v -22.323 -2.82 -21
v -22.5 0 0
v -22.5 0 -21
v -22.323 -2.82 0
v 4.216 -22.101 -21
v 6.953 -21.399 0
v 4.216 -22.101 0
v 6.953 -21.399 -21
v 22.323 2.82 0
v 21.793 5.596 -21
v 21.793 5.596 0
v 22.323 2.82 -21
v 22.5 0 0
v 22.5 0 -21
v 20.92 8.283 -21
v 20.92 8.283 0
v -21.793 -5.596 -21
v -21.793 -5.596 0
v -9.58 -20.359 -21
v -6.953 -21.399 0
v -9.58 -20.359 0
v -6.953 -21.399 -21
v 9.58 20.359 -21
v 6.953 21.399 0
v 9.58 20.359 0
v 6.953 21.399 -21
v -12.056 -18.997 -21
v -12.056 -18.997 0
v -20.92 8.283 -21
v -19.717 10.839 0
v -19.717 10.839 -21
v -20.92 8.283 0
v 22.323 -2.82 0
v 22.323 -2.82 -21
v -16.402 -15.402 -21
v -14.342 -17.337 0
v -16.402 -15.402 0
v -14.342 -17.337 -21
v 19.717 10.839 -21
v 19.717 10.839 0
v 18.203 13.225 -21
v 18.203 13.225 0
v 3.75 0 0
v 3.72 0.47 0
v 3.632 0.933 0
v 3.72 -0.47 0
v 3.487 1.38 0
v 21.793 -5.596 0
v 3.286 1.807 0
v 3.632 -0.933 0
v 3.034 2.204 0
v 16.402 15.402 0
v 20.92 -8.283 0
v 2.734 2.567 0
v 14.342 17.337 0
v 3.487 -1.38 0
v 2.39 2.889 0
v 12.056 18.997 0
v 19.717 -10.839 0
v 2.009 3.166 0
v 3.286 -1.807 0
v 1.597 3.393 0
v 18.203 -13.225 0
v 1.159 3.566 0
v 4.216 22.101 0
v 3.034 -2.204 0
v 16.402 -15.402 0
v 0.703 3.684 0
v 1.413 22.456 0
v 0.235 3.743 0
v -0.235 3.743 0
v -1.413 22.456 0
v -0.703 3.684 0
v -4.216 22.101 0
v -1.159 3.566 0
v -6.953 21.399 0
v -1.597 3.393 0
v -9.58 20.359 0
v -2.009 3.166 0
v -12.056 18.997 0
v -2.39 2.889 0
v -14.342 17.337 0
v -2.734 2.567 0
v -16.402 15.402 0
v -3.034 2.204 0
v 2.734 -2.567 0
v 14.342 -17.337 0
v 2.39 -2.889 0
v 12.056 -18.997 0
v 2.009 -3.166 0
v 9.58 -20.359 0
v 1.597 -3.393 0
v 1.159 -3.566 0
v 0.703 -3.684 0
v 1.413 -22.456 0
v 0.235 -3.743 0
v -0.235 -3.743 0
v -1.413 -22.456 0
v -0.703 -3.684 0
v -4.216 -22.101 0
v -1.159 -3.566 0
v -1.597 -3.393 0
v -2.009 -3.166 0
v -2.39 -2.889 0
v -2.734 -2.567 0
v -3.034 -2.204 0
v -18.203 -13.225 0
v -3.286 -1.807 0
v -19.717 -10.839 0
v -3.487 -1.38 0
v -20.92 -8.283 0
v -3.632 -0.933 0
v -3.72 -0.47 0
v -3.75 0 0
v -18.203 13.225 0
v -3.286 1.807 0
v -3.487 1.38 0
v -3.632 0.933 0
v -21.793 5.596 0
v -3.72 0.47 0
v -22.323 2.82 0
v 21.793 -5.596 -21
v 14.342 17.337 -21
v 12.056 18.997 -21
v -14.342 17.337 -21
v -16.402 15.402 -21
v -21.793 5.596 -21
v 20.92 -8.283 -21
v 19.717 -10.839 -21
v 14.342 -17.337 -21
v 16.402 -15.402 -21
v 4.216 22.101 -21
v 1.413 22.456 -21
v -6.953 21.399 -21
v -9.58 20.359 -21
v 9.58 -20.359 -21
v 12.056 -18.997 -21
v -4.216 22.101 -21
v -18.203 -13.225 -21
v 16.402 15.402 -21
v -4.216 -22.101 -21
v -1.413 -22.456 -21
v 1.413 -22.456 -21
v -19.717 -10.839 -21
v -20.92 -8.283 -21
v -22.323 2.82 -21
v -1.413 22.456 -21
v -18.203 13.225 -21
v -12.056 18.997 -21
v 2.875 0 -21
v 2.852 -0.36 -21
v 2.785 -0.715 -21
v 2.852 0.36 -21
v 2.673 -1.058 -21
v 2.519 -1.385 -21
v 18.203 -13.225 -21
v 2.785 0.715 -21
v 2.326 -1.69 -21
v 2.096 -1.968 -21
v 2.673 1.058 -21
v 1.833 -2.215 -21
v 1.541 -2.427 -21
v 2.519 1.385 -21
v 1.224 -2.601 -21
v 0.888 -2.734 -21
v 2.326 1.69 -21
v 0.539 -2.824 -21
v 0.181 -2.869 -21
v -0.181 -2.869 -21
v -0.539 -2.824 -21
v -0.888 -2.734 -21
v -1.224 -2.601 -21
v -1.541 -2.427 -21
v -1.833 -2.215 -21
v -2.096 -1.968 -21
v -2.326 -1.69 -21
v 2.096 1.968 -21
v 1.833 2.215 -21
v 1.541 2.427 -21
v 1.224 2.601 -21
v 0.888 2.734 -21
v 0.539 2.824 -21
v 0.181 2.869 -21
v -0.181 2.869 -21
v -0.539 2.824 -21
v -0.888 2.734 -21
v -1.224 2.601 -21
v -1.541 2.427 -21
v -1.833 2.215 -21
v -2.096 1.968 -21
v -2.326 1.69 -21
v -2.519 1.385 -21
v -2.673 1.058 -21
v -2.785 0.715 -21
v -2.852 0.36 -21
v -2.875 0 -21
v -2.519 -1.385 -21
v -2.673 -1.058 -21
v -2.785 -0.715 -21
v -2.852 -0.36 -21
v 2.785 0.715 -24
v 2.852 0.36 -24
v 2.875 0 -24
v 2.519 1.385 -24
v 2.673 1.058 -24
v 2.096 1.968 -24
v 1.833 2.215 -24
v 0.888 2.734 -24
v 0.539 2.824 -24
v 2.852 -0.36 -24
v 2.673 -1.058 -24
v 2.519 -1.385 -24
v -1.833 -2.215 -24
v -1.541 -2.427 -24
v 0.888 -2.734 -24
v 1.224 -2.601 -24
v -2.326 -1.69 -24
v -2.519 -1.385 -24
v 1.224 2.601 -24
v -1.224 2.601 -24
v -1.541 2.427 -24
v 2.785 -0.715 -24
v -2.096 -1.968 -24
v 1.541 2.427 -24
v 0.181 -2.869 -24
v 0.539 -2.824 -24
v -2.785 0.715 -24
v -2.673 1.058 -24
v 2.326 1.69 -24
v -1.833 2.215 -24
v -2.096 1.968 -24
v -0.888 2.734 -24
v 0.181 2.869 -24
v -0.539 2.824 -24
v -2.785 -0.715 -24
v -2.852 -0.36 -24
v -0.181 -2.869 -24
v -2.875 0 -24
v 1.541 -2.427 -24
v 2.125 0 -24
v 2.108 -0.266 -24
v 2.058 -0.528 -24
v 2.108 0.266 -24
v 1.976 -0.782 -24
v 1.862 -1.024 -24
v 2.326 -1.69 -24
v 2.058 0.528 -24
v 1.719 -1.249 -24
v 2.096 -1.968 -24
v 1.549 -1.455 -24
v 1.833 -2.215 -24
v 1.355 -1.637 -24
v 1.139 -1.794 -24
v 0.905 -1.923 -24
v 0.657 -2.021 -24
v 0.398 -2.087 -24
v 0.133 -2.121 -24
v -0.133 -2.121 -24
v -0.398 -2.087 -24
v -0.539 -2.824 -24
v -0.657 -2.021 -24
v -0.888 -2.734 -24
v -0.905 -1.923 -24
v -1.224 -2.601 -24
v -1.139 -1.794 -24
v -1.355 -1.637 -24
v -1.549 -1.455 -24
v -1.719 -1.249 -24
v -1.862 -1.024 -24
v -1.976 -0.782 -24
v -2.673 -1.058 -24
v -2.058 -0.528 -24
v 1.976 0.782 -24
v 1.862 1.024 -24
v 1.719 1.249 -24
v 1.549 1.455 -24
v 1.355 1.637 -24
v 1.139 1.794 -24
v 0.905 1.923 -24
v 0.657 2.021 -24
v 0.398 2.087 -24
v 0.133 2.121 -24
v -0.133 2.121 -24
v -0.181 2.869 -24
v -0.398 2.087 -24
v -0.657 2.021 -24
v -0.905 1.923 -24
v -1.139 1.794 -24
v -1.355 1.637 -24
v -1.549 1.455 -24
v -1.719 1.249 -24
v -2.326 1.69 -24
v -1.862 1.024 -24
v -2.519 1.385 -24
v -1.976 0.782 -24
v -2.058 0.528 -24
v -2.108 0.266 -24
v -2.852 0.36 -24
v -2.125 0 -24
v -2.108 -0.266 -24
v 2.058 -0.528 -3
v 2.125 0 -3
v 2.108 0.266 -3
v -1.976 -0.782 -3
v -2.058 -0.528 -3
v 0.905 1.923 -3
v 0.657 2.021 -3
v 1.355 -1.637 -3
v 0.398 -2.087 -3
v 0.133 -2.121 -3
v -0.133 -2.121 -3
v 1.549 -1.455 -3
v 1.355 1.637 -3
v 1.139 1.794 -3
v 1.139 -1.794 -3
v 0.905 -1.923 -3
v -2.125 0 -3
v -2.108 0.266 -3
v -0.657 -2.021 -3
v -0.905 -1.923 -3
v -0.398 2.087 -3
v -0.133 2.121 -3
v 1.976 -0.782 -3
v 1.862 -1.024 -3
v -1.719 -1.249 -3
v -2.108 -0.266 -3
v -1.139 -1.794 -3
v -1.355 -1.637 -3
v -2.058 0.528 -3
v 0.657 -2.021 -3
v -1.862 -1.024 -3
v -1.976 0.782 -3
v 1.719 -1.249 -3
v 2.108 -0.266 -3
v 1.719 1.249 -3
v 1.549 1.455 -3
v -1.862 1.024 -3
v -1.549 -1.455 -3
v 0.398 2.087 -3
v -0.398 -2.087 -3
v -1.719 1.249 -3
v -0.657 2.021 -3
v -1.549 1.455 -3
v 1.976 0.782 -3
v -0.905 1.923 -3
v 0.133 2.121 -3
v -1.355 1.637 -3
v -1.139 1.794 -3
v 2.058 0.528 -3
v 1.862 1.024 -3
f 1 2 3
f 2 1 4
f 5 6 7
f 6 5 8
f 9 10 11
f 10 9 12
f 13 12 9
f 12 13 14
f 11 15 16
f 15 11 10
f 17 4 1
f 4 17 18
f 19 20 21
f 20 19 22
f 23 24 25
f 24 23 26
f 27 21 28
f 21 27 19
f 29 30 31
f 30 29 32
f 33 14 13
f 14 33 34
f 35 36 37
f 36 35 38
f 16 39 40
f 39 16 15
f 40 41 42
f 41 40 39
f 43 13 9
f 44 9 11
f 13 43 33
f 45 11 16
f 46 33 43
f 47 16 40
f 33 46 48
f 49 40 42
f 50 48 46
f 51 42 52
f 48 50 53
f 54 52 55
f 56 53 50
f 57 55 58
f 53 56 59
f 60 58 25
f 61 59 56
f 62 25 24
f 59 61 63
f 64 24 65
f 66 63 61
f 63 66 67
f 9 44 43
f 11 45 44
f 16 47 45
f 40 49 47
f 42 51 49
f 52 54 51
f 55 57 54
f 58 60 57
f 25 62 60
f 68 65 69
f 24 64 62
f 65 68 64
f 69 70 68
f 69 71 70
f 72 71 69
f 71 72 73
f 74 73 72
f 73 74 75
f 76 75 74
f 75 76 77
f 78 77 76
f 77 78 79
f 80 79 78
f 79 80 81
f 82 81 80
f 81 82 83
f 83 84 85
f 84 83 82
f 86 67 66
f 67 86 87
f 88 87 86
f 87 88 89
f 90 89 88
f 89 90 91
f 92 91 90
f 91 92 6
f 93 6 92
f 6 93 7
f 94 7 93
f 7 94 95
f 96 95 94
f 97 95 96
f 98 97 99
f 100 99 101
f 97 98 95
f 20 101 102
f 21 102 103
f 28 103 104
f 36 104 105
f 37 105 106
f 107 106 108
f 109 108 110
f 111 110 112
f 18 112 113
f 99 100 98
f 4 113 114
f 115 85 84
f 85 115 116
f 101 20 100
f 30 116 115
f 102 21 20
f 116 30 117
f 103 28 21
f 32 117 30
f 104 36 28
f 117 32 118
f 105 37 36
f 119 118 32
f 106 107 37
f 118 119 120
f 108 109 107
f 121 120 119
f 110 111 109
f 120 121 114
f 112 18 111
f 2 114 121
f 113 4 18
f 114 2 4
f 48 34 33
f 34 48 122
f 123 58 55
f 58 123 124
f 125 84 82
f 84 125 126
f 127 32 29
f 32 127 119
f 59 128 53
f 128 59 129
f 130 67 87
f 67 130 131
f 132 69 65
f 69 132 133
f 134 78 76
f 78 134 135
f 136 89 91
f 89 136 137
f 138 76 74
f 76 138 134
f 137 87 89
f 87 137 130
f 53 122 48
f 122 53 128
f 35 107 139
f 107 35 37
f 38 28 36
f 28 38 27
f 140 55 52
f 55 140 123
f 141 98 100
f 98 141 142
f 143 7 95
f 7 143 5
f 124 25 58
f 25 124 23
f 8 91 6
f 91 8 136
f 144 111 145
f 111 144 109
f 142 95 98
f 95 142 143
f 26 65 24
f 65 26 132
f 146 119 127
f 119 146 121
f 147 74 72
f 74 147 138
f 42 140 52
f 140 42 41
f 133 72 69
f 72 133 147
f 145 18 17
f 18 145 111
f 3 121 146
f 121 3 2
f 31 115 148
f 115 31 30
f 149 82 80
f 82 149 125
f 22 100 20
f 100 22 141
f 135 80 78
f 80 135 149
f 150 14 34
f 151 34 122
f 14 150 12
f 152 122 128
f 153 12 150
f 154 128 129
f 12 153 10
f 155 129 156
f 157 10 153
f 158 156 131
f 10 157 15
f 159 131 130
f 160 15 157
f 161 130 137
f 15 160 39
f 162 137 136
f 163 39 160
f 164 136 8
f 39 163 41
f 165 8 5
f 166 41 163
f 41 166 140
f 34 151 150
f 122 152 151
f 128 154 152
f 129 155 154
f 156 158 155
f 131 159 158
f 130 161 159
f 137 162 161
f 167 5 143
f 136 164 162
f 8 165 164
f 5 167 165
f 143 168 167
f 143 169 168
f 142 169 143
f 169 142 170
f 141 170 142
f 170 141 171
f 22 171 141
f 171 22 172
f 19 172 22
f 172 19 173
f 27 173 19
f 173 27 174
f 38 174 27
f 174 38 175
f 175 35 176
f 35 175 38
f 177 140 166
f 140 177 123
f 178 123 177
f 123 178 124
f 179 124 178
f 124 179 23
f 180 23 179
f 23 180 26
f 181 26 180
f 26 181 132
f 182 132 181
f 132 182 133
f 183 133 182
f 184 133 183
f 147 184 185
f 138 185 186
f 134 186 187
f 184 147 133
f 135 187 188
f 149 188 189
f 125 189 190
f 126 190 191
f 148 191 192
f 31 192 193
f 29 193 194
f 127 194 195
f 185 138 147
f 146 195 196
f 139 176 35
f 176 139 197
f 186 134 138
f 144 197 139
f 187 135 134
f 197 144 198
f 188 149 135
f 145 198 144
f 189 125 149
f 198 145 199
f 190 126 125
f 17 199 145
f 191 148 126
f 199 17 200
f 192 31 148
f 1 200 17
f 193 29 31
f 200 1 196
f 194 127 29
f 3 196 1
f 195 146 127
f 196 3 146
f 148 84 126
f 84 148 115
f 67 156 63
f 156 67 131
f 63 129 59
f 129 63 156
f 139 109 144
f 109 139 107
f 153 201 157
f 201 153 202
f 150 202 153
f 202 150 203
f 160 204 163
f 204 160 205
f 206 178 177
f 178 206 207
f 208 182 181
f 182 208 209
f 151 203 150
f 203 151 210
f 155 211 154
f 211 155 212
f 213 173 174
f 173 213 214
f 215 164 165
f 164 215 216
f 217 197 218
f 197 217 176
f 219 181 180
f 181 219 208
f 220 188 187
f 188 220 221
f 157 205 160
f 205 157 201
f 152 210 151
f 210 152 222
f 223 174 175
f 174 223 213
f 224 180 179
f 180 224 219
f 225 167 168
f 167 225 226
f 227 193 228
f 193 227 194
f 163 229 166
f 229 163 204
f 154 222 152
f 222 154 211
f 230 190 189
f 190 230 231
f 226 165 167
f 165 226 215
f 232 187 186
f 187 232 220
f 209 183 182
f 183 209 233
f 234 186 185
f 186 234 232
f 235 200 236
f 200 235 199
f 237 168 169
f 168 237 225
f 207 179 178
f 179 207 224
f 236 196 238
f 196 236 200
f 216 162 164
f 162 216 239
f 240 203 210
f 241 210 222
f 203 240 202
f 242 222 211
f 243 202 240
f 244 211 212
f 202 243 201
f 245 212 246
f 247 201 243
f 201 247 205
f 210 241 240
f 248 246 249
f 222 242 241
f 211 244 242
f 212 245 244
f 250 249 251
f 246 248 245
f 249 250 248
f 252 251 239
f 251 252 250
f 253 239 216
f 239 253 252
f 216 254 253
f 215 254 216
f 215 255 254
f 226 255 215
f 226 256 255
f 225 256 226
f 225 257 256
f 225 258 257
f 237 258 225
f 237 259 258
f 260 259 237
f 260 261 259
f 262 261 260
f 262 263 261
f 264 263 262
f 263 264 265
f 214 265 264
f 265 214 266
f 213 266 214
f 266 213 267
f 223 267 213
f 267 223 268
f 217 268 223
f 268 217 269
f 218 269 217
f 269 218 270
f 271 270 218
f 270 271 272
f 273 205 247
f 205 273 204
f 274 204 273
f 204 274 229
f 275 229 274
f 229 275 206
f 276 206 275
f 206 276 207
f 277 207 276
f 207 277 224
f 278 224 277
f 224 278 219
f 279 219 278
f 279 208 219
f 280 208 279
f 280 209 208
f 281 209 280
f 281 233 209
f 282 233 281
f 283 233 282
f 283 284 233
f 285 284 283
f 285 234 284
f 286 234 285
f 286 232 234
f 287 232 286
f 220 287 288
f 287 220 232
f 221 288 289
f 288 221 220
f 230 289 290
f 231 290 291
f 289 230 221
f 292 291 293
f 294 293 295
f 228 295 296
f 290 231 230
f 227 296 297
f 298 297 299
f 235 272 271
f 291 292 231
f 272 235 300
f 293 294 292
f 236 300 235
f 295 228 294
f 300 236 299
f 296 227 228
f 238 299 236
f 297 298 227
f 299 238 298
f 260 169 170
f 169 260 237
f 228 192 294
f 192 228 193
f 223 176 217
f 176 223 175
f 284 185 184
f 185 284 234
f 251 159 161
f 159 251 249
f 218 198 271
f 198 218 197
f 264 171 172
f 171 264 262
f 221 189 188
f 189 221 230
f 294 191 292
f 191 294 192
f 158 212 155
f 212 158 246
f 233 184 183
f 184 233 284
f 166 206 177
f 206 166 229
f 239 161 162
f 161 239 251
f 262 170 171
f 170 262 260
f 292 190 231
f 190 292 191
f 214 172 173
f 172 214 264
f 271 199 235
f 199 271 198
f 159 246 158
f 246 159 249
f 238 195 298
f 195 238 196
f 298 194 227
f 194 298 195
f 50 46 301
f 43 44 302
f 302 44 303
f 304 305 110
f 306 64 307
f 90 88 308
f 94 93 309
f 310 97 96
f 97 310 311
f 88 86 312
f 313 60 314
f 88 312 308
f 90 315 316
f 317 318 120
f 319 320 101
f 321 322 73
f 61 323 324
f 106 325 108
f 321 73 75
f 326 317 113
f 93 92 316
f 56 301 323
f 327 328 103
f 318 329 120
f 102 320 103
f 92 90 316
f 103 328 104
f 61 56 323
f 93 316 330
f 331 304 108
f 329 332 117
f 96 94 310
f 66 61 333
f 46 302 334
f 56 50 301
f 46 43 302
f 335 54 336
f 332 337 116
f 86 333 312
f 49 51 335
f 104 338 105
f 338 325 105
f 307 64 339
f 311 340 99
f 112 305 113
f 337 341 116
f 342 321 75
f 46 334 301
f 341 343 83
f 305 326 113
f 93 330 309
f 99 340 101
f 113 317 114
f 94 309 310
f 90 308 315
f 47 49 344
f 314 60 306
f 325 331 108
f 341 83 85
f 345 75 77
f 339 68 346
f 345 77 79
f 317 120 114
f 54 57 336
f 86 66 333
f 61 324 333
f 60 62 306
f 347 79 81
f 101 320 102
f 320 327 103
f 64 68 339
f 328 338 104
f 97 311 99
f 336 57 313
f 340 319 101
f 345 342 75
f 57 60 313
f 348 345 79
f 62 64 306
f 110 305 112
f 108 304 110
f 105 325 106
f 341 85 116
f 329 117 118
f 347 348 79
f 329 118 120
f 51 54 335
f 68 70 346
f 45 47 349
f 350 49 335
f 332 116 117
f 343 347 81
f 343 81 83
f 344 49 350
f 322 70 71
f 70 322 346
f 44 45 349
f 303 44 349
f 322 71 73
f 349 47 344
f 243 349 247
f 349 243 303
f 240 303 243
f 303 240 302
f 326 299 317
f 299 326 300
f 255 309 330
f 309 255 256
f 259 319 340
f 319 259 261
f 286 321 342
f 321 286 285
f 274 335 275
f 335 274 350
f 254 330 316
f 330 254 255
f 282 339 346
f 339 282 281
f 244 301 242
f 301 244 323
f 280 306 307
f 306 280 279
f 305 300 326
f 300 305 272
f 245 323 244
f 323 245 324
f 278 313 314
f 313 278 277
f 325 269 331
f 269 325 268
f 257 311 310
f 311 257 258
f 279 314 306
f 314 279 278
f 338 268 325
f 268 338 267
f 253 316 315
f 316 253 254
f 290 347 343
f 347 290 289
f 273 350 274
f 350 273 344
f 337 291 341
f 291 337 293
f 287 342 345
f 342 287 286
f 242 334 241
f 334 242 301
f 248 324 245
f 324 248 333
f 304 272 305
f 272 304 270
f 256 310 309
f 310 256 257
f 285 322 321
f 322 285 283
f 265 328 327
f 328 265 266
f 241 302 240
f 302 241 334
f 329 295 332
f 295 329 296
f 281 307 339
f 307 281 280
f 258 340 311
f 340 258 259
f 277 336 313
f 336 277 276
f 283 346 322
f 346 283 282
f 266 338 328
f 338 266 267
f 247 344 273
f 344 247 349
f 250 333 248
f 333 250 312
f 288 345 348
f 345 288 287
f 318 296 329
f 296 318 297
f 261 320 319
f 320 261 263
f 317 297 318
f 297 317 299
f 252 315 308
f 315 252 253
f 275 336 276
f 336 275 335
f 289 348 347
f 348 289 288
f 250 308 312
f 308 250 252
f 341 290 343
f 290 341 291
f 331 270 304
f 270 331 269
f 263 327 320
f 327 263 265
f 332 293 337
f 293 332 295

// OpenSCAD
$fn = 50;

difference() {
	union() {
		translate(v = [0, 0, -21.0]) {
			cylinder(h = 21, r = 22.5);
		}
		#translate(v = [0, 0, -24.0]) {
			cylinder(h = 24, r = 2.875);
		}
	}
	union() {
		translate(v = [0, 0, 0]) {
			rotate(a = [0, 0, 0]) {
				difference() {
					union() {
						translate(v = [0, 0, -24.0]) {
							cylinder(h = 24, r = 2.0);
						}
						translate(v = [0, 0, -3]) {
							cylinder(h = 3, r1 = 2.125, r2 = 3.75);
						}
						translate(v = [0, 0, -24.0]) {
							cylinder(h = 24, r = 2.125);
						}
						translate(v = [0, 0, -24.0]) {
							cylinder(h = 24, r = 2.0);
						}
					}
					union();
				}
			}
		}
	}
}
